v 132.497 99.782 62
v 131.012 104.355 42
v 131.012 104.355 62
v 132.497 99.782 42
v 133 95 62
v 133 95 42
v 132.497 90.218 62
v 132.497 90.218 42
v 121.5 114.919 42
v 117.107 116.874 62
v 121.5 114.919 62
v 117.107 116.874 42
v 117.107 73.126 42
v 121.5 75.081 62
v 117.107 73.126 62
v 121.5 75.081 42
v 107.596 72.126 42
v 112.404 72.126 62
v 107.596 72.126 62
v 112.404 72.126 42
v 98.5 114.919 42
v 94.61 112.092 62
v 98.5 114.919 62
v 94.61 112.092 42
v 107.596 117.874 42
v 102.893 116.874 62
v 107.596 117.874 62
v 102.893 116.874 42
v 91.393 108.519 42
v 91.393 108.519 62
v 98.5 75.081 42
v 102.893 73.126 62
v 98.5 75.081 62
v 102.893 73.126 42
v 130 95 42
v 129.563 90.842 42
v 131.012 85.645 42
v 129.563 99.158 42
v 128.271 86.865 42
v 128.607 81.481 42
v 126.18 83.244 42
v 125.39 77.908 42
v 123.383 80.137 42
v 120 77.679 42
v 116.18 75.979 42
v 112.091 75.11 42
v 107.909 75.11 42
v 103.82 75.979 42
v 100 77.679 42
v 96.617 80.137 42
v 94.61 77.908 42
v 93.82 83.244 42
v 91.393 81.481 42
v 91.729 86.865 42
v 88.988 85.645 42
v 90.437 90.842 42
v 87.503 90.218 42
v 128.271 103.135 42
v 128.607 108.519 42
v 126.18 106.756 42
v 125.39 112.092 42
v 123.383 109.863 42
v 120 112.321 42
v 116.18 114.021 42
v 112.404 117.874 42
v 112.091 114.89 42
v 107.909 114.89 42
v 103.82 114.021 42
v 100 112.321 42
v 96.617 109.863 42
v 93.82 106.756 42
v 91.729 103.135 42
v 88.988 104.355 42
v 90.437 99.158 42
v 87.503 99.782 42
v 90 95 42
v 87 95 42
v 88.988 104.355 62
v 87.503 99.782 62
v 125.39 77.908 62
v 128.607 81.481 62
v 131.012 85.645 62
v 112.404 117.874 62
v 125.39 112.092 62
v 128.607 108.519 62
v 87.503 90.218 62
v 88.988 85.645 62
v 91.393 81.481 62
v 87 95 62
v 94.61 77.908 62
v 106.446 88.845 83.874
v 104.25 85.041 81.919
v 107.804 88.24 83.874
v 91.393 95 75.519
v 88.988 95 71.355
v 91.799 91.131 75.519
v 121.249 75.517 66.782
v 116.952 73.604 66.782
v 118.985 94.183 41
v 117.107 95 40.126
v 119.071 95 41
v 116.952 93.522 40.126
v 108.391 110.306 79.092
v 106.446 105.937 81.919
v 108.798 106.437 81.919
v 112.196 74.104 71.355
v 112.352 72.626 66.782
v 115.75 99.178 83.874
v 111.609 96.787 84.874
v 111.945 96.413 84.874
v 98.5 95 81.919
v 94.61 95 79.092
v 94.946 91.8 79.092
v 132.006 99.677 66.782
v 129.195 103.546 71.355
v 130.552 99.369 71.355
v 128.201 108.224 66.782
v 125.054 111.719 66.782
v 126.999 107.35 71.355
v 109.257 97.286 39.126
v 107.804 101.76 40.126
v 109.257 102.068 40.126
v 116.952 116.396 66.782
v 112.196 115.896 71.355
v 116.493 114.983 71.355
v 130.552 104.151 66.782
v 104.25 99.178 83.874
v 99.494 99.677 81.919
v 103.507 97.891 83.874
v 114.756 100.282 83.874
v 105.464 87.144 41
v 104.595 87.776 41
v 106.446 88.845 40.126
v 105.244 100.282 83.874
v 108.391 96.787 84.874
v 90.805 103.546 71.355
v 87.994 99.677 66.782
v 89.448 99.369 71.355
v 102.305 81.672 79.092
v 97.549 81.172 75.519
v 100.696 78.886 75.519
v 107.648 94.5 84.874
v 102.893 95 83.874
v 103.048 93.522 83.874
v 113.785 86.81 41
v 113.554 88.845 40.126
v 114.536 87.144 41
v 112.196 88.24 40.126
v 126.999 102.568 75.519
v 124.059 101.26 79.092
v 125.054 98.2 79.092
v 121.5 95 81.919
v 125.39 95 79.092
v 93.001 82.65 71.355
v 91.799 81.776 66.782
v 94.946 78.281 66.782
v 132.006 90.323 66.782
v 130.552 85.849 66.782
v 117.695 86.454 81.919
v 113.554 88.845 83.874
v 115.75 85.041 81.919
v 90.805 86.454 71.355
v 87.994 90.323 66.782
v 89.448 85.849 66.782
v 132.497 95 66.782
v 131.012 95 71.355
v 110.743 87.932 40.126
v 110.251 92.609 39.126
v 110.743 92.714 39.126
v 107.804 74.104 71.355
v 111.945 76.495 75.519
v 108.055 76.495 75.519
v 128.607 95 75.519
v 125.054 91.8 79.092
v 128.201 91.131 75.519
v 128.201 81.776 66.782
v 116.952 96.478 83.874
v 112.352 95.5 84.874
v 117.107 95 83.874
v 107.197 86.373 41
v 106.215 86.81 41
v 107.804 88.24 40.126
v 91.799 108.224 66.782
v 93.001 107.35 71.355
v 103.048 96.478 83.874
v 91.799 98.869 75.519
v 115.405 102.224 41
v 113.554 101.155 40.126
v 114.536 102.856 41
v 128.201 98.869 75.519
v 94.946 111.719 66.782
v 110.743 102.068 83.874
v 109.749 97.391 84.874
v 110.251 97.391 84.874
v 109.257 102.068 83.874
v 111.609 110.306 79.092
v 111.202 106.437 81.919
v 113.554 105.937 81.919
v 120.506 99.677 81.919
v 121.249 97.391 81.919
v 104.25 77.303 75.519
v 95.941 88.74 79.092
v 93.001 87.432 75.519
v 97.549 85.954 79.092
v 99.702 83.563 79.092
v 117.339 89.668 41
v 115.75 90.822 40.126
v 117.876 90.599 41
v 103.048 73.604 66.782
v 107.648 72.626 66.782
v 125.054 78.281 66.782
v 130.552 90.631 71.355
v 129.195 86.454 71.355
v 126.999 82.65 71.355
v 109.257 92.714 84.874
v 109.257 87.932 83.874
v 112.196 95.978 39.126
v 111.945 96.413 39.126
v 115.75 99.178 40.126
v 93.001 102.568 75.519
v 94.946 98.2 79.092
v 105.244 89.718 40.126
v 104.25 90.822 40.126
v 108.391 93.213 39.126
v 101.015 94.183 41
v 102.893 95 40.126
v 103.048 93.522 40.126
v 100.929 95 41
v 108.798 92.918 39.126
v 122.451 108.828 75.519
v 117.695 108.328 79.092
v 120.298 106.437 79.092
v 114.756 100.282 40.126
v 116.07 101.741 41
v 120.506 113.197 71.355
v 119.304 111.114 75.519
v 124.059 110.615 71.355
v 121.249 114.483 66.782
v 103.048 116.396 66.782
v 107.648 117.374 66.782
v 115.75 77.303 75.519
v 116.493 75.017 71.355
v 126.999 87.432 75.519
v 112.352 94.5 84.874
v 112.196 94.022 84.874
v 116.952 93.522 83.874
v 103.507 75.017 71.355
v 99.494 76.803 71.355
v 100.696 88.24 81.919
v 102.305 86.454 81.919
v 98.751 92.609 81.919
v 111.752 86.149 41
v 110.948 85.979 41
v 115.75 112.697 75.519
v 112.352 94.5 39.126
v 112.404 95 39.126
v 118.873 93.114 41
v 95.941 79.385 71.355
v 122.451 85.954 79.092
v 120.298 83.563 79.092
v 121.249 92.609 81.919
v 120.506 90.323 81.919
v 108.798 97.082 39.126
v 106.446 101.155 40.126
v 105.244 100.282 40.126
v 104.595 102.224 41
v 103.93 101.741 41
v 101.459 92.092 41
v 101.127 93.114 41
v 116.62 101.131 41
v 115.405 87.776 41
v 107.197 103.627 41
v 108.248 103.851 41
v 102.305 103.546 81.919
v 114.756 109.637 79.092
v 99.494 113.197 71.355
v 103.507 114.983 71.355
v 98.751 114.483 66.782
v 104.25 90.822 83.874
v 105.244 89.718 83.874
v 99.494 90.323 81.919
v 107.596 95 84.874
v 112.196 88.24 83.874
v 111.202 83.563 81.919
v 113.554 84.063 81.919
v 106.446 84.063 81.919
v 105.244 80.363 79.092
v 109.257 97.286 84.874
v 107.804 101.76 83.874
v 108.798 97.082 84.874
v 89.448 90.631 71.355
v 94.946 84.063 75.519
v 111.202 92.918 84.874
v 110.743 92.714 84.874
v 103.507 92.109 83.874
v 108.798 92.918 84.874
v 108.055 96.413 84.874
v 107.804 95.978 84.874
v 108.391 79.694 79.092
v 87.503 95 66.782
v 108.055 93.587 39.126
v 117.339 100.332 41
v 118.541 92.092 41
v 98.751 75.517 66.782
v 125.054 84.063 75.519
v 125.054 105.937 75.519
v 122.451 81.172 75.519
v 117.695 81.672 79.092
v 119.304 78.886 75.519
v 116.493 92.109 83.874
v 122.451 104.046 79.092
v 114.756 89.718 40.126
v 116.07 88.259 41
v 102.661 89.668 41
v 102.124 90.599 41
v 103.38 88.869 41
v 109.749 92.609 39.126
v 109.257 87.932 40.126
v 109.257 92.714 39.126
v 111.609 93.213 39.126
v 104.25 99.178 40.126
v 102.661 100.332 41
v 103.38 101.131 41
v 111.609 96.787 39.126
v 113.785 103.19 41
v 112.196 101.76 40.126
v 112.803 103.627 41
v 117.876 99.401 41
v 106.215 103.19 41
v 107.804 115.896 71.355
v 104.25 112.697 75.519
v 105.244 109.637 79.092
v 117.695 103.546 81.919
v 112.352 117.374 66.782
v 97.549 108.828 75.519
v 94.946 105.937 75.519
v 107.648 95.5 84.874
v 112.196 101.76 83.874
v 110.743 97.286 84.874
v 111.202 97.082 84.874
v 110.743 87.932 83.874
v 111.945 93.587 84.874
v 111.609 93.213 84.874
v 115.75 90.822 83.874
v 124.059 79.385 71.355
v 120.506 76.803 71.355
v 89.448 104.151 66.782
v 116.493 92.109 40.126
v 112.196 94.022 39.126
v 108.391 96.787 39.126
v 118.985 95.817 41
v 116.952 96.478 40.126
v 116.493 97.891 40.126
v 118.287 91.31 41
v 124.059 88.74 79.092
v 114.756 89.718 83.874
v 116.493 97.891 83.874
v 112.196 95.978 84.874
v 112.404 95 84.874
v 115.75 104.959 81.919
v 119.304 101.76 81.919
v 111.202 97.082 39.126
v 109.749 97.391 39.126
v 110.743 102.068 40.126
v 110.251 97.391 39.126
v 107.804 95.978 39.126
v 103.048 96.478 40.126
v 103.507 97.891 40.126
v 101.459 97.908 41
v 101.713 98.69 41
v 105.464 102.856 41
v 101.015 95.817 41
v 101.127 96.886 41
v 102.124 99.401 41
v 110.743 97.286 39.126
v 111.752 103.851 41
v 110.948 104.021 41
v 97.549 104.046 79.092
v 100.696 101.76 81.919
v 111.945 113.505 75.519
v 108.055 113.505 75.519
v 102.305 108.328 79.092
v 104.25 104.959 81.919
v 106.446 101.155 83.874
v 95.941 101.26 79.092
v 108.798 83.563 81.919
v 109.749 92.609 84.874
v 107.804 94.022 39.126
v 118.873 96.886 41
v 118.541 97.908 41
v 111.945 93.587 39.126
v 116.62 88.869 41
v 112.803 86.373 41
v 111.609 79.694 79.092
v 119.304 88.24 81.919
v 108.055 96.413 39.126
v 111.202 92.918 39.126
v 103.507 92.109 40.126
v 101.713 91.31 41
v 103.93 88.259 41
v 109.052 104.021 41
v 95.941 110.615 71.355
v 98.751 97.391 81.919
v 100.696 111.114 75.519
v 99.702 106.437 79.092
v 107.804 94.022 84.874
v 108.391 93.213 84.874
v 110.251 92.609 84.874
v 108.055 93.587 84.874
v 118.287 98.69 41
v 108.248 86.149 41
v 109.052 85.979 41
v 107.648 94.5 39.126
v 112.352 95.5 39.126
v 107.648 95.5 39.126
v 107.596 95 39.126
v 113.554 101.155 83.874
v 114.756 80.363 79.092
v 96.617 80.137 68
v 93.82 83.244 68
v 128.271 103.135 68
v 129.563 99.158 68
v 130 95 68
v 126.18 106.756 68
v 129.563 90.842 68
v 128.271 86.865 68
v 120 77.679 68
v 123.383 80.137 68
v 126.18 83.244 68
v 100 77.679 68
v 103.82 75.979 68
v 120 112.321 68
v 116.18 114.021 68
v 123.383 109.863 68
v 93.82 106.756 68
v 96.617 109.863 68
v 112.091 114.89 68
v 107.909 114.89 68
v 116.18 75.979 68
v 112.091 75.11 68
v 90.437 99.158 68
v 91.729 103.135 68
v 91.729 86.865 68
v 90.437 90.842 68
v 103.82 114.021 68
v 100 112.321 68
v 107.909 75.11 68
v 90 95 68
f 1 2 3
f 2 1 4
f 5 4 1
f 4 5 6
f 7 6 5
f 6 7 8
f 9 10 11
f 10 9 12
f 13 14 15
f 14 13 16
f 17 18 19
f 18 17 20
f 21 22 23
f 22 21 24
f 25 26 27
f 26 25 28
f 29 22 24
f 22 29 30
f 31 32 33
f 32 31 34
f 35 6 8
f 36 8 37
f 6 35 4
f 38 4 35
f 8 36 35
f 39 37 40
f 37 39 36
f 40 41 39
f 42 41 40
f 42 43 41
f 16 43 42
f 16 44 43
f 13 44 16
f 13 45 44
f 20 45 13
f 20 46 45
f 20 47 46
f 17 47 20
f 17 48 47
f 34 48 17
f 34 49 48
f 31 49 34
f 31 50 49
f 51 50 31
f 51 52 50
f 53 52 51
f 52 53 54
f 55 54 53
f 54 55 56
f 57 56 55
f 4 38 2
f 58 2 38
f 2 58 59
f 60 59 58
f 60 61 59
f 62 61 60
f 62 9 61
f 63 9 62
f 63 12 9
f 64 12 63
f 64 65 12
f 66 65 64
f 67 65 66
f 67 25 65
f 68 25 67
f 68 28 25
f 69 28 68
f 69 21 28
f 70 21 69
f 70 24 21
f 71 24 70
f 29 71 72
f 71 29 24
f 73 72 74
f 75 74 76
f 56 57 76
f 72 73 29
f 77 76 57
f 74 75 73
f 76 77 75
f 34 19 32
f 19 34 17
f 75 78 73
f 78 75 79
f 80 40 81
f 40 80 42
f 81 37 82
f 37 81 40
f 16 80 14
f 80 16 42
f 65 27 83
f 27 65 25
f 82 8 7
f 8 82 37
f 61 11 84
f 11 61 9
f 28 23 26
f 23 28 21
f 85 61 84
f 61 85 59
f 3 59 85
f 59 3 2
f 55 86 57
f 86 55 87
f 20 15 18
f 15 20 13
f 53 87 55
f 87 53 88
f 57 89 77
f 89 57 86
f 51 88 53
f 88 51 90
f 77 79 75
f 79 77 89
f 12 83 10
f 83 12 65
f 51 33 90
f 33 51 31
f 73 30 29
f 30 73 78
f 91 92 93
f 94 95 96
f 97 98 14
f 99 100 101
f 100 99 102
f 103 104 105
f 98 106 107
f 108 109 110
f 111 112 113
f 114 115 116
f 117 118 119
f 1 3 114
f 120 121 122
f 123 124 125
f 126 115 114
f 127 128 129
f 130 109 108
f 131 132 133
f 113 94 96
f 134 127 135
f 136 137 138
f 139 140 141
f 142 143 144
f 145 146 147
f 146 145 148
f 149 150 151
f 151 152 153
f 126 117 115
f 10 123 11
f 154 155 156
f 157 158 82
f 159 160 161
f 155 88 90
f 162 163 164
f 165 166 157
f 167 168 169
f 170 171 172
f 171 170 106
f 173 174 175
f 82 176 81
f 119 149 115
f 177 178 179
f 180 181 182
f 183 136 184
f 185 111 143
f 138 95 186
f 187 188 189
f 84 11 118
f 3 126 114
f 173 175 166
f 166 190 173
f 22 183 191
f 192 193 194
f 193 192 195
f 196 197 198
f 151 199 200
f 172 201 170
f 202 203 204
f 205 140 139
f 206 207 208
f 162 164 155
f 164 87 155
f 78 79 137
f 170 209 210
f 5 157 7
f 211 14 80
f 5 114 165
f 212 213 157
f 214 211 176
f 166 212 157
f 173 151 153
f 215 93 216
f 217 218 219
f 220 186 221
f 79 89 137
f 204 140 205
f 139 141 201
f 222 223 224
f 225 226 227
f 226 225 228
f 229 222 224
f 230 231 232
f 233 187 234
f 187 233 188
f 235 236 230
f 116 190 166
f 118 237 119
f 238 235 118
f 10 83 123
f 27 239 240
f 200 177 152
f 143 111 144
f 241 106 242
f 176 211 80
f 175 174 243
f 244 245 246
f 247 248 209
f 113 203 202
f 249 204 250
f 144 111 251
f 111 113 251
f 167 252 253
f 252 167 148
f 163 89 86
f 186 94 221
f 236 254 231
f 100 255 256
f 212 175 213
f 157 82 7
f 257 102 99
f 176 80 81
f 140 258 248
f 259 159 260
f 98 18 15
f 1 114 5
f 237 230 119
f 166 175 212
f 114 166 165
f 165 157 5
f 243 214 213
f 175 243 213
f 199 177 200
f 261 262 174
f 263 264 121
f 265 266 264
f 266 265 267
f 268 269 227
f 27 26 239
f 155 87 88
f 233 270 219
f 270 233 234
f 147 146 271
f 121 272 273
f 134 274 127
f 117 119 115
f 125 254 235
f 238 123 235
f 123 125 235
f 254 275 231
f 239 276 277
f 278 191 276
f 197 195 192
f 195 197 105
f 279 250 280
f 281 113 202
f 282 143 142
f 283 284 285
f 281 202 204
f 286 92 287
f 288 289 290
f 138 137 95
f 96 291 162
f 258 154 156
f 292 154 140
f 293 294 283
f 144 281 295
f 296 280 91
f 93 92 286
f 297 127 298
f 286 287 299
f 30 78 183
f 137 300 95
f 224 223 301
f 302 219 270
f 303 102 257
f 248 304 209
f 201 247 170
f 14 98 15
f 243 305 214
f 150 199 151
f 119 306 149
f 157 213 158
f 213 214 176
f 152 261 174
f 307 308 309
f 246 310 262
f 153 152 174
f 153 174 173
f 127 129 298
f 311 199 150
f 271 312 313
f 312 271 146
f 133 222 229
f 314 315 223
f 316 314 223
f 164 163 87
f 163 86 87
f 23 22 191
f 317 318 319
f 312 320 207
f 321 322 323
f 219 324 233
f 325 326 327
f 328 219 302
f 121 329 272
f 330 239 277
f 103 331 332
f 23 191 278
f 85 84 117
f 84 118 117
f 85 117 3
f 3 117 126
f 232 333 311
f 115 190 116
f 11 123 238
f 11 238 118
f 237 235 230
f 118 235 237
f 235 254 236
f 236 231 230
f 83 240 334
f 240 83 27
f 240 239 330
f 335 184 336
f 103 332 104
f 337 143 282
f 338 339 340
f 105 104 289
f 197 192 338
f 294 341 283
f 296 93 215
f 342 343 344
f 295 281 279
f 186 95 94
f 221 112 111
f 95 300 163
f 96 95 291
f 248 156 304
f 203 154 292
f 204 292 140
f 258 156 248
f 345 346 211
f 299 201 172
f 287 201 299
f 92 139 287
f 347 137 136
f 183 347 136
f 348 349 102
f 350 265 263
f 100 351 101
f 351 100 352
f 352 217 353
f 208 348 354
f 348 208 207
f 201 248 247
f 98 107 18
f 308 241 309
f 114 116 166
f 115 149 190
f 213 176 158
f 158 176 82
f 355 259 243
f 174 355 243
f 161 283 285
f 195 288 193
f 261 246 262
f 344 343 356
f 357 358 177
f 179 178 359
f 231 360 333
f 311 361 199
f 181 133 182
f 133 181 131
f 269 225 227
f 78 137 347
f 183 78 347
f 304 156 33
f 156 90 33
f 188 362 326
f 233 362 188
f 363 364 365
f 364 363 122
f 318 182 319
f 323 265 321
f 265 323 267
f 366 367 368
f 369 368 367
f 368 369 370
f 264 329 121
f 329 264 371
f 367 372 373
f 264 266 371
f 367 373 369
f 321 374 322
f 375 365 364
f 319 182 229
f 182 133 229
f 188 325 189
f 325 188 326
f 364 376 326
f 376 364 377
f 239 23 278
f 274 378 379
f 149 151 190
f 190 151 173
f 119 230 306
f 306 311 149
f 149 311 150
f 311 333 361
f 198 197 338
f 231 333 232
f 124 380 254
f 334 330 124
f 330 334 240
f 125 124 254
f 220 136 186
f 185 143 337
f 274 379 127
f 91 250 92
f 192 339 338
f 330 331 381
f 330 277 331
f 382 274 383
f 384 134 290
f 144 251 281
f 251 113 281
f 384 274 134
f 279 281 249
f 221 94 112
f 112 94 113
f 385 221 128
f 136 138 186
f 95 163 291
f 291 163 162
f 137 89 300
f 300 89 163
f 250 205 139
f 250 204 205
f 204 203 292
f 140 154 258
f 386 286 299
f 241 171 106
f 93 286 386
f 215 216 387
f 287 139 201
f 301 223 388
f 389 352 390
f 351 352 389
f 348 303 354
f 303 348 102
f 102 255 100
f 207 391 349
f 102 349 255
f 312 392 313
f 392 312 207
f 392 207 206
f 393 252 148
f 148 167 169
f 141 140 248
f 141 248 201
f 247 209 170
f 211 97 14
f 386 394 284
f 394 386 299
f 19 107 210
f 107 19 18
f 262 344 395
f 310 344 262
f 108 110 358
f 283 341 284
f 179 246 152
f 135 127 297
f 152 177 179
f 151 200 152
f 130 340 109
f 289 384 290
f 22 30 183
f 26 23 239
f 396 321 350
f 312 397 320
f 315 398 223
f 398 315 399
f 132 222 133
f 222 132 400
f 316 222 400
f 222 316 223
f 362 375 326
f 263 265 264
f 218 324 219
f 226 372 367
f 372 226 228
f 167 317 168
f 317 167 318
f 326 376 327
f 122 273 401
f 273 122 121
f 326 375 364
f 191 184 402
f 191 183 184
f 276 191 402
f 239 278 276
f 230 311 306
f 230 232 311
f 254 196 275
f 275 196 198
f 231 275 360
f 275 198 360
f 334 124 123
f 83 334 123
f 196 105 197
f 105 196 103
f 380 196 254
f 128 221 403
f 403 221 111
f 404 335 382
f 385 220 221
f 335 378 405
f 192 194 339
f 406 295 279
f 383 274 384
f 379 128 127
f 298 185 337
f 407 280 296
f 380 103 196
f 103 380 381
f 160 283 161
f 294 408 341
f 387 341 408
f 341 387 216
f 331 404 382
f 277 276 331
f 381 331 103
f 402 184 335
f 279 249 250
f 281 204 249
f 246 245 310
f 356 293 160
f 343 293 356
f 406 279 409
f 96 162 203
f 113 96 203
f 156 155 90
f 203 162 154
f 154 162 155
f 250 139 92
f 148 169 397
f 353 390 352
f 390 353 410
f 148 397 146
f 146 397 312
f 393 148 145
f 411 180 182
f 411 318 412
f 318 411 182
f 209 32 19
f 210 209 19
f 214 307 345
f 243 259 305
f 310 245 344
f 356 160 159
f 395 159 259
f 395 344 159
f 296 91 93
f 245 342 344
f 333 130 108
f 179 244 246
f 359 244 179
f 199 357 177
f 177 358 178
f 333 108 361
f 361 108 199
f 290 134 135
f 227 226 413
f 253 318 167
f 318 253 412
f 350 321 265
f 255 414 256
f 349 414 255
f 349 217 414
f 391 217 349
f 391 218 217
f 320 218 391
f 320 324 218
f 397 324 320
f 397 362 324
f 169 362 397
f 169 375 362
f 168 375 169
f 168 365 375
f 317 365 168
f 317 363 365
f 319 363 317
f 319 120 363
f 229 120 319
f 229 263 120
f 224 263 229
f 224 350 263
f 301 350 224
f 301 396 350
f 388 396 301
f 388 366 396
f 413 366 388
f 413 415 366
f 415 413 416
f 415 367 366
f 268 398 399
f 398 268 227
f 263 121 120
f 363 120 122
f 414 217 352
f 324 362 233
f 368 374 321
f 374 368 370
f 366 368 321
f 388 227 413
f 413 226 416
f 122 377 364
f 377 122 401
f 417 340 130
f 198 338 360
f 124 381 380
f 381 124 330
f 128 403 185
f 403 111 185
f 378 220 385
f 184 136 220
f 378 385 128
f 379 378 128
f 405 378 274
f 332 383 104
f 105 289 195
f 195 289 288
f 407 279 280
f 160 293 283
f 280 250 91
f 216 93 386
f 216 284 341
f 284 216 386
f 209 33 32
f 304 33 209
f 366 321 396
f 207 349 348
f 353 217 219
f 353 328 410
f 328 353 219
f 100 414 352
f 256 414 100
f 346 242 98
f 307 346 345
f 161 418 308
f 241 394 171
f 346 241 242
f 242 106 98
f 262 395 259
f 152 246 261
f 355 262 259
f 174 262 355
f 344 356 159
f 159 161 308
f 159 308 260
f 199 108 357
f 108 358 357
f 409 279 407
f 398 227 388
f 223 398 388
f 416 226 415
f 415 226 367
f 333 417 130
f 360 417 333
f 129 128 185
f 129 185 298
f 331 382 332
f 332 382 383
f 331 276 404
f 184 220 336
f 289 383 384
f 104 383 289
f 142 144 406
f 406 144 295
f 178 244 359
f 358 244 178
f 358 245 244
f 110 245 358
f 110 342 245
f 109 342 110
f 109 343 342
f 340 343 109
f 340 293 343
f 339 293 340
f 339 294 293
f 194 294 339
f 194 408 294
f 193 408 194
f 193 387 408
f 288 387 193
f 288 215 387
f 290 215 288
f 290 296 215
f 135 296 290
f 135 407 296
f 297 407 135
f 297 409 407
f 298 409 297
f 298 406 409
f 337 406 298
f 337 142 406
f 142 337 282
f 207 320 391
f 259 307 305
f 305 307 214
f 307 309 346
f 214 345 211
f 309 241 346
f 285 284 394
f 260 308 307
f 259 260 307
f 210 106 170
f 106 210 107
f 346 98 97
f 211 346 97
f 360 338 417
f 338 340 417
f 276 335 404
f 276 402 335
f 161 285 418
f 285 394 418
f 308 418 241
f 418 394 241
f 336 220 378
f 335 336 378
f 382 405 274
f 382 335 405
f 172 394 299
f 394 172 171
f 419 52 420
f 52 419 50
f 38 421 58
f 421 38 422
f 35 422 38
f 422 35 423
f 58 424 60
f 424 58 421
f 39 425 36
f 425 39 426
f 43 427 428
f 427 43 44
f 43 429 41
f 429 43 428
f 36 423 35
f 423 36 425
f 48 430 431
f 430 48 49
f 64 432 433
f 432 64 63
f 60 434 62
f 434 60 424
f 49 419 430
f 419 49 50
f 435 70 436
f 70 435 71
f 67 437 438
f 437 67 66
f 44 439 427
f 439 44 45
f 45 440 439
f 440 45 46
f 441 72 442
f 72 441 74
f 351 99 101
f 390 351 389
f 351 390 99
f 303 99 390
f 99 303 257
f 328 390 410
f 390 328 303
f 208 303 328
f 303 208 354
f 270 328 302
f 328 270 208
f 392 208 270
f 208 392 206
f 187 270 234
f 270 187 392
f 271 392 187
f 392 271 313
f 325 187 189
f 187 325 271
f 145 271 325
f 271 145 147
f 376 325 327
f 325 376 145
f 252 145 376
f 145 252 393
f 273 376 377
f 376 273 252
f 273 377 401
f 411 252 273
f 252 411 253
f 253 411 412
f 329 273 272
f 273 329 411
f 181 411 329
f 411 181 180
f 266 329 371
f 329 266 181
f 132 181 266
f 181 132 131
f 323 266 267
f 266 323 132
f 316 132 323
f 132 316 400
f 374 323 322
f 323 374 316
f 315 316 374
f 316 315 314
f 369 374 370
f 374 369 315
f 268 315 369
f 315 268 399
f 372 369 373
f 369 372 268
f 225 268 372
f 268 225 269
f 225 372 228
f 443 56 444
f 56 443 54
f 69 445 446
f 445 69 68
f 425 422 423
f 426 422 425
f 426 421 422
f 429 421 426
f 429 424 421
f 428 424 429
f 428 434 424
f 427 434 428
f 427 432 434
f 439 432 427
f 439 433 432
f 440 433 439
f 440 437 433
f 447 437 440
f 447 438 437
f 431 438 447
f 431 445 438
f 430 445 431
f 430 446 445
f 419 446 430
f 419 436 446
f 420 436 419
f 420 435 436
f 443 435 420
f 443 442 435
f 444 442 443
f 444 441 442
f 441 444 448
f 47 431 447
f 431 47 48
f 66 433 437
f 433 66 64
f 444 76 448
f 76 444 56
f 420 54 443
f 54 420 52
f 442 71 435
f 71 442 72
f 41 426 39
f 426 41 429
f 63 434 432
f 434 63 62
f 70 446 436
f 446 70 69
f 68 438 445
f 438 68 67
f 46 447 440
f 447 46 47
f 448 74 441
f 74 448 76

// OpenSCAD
// Bottle bell — REFERENCE MOCKUP (non-printable commodity part, §5.4).
//
// Classification: reference_only (mockups playbook). The bell is a COMMODITY
// part, not a printed part (decided §5.4) — this mockup approximates a
// 2" bottle neck/bell that caps the standpipe tower crest and locates over it
// via the bell-seat collar.
//
// Source: docs/solarpunk_series.md §5.4 ("2\" bottle neck/bell as the standpipe
// bell"); tower crest interface (bell seat) is the tray's maximum_flood_height.
// UNCERTAINTY: actual bottle dimensions are a commodity choice (open decision
// #2 / #5) — placeholder geometry only.

bell_inner_diameter = is_undef(bell_inner_diameter) ? 40.0 : bell_inner_diameter;
bell_wall           = is_undef(bell_wall)           ? 3.0   : bell_wall;
bell_height         = is_undef(bell_height)         ? 20.0  : bell_height;
// Seat at the default tray crest; override with the built tray's value.
bell_seat_z         = is_undef(bell_seat_z)         ? 42.0  : bell_seat_z;

module bell() {
    // Hollow bell: neck sleeve + domed cap (approximation of a bottle mouth).
    difference() {
        union() {
            cylinder(h = bell_height, r = bell_inner_diameter / 2 + bell_wall, center = false);
            translate([0, 0, bell_height])
                sphere(r = bell_inner_diameter / 2 + bell_wall);
        }
        translate([0, 0, -1])
            cylinder(h = bell_height + bell_wall * 2 + 1, r = bell_inner_diameter / 2, center = false);
    }
}

// Position the bell over the default tower location for context.
translate([110, 95, bell_seat_z]) bell();
